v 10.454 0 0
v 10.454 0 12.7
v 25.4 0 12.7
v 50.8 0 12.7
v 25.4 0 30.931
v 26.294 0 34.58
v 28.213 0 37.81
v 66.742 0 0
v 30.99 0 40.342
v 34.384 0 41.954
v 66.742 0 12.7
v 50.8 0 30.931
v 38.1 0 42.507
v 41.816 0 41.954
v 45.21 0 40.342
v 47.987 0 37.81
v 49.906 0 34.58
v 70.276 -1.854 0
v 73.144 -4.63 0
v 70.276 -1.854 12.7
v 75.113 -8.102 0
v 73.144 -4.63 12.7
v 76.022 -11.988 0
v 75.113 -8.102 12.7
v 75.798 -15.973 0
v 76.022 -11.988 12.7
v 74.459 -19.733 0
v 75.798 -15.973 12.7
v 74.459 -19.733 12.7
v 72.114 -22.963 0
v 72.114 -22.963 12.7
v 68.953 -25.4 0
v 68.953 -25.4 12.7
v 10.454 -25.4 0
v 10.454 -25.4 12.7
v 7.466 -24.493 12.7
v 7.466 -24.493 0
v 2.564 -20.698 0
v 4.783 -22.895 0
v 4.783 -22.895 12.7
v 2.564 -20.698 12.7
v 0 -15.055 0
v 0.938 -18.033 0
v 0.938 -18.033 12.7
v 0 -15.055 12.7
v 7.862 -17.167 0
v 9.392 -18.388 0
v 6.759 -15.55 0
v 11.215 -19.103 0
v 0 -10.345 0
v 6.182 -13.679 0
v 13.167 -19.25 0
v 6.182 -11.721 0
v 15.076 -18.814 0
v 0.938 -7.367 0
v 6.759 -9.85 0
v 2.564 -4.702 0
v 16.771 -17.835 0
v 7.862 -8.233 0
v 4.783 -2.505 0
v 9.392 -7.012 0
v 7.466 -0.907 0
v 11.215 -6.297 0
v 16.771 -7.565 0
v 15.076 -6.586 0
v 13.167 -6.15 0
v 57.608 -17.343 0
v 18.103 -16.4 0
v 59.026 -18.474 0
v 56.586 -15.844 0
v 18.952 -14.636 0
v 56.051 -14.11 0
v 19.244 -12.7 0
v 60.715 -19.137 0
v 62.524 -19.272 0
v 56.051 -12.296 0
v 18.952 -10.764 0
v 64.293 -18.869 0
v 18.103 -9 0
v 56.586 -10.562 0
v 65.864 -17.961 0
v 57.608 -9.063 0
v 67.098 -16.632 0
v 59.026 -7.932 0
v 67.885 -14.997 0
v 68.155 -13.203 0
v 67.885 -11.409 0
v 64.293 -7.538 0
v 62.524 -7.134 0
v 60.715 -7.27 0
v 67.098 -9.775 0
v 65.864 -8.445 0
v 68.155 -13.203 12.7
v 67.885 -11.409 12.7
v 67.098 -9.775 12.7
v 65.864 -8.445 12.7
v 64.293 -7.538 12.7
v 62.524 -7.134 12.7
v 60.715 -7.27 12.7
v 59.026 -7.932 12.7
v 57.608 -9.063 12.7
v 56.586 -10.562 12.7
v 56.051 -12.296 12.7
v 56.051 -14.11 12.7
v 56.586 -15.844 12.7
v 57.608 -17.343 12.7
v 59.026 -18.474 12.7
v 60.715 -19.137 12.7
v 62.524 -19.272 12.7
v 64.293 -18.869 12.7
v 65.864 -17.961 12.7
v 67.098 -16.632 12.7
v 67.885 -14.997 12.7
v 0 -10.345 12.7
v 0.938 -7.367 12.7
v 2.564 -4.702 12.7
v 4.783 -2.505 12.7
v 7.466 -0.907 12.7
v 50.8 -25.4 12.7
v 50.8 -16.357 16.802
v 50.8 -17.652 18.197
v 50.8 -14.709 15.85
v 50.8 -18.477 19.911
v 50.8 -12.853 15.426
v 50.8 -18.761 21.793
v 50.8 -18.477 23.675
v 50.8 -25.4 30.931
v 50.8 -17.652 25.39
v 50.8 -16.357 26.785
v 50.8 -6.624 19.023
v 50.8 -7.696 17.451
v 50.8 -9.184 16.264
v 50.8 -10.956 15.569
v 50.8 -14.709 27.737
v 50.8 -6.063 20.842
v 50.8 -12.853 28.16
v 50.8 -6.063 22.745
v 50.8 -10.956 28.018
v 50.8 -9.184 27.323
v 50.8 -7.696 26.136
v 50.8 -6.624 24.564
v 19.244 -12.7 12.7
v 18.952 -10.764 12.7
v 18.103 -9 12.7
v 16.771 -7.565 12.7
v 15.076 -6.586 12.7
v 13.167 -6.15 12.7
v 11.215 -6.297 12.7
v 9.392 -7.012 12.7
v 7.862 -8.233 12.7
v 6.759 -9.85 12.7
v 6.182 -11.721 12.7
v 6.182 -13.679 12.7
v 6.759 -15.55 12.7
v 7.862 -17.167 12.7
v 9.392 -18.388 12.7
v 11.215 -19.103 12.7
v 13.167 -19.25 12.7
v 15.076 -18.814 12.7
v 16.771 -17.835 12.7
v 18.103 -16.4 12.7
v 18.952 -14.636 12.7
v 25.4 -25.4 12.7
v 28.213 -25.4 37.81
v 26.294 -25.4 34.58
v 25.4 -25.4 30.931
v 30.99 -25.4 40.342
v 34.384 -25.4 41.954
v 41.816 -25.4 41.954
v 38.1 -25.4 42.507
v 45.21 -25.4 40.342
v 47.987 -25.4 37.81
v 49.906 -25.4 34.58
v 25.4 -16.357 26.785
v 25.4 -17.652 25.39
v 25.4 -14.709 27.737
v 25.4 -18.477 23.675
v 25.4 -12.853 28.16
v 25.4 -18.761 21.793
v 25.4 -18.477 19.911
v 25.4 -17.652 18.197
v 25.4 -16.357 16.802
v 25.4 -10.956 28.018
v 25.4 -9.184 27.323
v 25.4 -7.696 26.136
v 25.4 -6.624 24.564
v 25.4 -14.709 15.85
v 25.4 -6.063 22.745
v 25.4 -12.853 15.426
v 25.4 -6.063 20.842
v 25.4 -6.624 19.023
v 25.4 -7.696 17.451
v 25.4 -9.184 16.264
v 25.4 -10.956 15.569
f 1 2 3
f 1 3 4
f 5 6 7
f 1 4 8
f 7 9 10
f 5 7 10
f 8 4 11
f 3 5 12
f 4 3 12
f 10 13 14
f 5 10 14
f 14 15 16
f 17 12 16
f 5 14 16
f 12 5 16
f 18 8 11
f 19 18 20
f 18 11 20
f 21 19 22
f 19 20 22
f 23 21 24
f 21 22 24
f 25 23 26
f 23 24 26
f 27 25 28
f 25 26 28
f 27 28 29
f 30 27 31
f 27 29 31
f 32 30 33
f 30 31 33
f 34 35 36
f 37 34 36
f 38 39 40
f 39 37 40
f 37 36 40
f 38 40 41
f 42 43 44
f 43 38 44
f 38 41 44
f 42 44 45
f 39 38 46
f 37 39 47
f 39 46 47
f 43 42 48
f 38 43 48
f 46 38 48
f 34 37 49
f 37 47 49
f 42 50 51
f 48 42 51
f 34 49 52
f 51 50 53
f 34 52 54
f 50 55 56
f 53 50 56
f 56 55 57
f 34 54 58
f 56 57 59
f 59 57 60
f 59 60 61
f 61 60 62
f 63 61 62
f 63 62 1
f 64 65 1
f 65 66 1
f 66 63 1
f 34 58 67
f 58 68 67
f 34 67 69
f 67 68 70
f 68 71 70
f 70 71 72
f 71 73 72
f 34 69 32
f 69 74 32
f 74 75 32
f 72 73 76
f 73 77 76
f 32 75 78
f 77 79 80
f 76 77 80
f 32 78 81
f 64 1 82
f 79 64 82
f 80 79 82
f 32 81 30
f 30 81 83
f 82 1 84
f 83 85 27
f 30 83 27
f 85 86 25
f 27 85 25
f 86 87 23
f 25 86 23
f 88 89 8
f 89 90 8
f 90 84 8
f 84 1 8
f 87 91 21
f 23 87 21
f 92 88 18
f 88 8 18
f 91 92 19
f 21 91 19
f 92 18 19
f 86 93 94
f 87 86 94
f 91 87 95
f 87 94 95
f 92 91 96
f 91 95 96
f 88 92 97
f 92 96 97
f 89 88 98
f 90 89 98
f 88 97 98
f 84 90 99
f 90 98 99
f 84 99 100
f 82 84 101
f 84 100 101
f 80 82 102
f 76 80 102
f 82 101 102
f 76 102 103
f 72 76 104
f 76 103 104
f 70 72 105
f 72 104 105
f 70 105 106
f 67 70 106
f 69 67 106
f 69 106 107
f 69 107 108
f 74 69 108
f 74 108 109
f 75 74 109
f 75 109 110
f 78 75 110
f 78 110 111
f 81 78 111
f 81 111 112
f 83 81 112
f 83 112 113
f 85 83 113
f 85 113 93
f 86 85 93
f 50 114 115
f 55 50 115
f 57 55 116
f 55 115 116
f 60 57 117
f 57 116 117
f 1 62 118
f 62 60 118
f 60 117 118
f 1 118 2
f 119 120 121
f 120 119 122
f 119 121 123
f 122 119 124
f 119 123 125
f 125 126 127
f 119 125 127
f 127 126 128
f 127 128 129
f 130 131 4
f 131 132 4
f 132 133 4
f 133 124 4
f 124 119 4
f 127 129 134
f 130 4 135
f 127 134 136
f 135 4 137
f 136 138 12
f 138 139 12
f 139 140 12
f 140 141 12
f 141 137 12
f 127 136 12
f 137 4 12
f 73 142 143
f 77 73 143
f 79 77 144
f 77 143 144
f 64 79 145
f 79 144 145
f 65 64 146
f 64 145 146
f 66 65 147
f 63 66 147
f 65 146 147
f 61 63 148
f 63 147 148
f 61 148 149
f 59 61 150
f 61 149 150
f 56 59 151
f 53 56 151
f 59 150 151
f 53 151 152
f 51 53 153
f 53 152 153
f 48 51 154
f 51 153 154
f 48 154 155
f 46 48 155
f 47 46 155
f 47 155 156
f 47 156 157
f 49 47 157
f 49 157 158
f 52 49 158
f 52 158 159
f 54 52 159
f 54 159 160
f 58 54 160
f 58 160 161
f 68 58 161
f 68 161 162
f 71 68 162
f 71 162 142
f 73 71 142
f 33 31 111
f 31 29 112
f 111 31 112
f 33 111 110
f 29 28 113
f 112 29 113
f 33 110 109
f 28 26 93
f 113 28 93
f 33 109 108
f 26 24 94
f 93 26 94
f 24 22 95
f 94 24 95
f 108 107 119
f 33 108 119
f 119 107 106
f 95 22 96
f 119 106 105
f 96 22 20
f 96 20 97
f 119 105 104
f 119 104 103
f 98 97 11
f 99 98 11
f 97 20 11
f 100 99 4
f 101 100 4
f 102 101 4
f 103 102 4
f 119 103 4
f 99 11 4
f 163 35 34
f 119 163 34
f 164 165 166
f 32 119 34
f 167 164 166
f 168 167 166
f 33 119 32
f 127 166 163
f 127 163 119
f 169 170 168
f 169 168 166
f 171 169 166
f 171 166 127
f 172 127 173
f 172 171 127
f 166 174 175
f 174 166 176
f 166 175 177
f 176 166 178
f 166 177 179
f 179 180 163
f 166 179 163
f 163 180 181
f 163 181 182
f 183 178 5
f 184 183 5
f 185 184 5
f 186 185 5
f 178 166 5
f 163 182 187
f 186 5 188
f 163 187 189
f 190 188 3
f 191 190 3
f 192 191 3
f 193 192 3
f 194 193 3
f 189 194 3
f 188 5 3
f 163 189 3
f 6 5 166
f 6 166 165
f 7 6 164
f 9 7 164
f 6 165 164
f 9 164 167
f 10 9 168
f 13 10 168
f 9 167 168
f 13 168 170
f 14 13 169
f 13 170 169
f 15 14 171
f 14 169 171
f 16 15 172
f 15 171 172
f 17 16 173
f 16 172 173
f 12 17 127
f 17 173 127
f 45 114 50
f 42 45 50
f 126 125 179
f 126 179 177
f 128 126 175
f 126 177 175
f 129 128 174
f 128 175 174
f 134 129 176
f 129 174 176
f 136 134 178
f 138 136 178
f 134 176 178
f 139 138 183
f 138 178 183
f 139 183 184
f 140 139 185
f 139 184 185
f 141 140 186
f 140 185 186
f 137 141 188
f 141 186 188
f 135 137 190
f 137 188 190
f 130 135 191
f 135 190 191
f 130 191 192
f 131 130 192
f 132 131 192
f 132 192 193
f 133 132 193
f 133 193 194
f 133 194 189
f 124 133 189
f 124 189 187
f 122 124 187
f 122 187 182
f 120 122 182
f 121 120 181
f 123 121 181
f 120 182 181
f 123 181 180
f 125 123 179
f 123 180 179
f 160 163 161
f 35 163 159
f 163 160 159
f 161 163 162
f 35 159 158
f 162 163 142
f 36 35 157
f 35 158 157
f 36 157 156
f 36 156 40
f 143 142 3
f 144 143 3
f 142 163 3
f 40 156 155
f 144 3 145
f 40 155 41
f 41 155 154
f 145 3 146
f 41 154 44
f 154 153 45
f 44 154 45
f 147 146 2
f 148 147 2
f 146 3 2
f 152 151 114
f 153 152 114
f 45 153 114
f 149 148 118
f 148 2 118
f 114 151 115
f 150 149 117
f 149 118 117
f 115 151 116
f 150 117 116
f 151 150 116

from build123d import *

# Parameters (mm, degrees)
F1_DEPTH  = 25.4
F3_DEPTH  = 25.4
F5_DEPTH  = 25.4
F7_DEPTH  = 25.4
F8_R      = 6.567991
F9_DEPTH  = 25.4
F10_R     = 6.086179
F11_DEPTH = 25.4
F12_R     = 6.384731
F13_DEPTH = 25.4


with BuildPart() as f1:
    # F0 (on Front) → F1 (new body)
    with BuildSketch(Plane.XZ):
        Polygon((0, 12.7), (0, 0), (76.2, 0), (76.2, 12.7), (50.8, 12.7), (50.8, 44.45), (25.4, 44.45), (25.4, 12.7), align=None)
    extrude(amount=F1_DEPTH)

    # F2 (on face) → F3 (cut)
    with BuildSketch(Plane.XZ.offset(25.4)):
        with BuildLine():
            ThreePointArc((25.4, 30.930717), (38.1, 42.507362), (50.8, 30.930717))
            Line((50.8, 30.930717), (50.8, 44.45))
            Line((50.8, 44.45), (25.4, 44.45))
            Line((25.4, 44.45), (25.4, 30.930717))
        make_face()
    extrude(amount=-F3_DEPTH, mode=Mode.SUBTRACT)

    # F4 (on face) → F5 (cut)
    with BuildSketch(Plane.XY.offset(12.7)):
        with BuildLine():
            ThreePointArc((0, -10.345371), (3.606994, -3.535954), (10.453569, 0))
            Line((10.453569, 0), (0, 0))
            Line((0, 0), (0, -10.345371))
        make_face()
        with BuildLine():
            ThreePointArc((10.453569, -25.4), (3.606994, -21.864046), (0, -15.054629))
            Line((0, -15.054629), (0, -25.4))
            Line((0, -25.4), (10.453569, -25.4))
        make_face()
    extrude(amount=-F5_DEPTH, mode=Mode.SUBTRACT)

    # F6 (on face) → F7 (cut)
    with BuildSketch(Plane.XY.offset(12.7)):
        with BuildLine():
            ThreePointArc((66.74201, 0), (76.021911, -11.988349), (68.953343, -25.4))
            Line((68.953343, -25.4), (76.2, -25.4))
            Line((76.2, -25.4), (76.2, 0))
            Line((76.2, 0), (66.74201, 0))
        make_face()
    extrude(amount=-F7_DEPTH, mode=Mode.SUBTRACT)

    # F8 (on face) → F9 (cut)
    with BuildSketch(Plane.XY.offset(12.7)):
        with Locations((12.676189, -12.7)):
            Circle(F8_R)
    extrude(amount=-F9_DEPTH, mode=Mode.SUBTRACT)

    # F10 (on face) → F11 (cut)
    with BuildSketch(Plane.XY.offset(12.7)):
        with Locations((62.069037, -13.20309)):
            Circle(F10_R)
    extrude(amount=-F11_DEPTH, mode=Mode.SUBTRACT)

    # F12 (on face) → F13 (cut)
    with BuildSketch(Plane(origin=(25.4, 0, 0), x_dir=(0, -1, 0), z_dir=(-1, 0, 0))):
        with Locations((12.376302, 21.793298)):
            Circle(F12_R)
    extrude(amount=-F13_DEPTH, mode=Mode.SUBTRACT)


solid = f1.part
